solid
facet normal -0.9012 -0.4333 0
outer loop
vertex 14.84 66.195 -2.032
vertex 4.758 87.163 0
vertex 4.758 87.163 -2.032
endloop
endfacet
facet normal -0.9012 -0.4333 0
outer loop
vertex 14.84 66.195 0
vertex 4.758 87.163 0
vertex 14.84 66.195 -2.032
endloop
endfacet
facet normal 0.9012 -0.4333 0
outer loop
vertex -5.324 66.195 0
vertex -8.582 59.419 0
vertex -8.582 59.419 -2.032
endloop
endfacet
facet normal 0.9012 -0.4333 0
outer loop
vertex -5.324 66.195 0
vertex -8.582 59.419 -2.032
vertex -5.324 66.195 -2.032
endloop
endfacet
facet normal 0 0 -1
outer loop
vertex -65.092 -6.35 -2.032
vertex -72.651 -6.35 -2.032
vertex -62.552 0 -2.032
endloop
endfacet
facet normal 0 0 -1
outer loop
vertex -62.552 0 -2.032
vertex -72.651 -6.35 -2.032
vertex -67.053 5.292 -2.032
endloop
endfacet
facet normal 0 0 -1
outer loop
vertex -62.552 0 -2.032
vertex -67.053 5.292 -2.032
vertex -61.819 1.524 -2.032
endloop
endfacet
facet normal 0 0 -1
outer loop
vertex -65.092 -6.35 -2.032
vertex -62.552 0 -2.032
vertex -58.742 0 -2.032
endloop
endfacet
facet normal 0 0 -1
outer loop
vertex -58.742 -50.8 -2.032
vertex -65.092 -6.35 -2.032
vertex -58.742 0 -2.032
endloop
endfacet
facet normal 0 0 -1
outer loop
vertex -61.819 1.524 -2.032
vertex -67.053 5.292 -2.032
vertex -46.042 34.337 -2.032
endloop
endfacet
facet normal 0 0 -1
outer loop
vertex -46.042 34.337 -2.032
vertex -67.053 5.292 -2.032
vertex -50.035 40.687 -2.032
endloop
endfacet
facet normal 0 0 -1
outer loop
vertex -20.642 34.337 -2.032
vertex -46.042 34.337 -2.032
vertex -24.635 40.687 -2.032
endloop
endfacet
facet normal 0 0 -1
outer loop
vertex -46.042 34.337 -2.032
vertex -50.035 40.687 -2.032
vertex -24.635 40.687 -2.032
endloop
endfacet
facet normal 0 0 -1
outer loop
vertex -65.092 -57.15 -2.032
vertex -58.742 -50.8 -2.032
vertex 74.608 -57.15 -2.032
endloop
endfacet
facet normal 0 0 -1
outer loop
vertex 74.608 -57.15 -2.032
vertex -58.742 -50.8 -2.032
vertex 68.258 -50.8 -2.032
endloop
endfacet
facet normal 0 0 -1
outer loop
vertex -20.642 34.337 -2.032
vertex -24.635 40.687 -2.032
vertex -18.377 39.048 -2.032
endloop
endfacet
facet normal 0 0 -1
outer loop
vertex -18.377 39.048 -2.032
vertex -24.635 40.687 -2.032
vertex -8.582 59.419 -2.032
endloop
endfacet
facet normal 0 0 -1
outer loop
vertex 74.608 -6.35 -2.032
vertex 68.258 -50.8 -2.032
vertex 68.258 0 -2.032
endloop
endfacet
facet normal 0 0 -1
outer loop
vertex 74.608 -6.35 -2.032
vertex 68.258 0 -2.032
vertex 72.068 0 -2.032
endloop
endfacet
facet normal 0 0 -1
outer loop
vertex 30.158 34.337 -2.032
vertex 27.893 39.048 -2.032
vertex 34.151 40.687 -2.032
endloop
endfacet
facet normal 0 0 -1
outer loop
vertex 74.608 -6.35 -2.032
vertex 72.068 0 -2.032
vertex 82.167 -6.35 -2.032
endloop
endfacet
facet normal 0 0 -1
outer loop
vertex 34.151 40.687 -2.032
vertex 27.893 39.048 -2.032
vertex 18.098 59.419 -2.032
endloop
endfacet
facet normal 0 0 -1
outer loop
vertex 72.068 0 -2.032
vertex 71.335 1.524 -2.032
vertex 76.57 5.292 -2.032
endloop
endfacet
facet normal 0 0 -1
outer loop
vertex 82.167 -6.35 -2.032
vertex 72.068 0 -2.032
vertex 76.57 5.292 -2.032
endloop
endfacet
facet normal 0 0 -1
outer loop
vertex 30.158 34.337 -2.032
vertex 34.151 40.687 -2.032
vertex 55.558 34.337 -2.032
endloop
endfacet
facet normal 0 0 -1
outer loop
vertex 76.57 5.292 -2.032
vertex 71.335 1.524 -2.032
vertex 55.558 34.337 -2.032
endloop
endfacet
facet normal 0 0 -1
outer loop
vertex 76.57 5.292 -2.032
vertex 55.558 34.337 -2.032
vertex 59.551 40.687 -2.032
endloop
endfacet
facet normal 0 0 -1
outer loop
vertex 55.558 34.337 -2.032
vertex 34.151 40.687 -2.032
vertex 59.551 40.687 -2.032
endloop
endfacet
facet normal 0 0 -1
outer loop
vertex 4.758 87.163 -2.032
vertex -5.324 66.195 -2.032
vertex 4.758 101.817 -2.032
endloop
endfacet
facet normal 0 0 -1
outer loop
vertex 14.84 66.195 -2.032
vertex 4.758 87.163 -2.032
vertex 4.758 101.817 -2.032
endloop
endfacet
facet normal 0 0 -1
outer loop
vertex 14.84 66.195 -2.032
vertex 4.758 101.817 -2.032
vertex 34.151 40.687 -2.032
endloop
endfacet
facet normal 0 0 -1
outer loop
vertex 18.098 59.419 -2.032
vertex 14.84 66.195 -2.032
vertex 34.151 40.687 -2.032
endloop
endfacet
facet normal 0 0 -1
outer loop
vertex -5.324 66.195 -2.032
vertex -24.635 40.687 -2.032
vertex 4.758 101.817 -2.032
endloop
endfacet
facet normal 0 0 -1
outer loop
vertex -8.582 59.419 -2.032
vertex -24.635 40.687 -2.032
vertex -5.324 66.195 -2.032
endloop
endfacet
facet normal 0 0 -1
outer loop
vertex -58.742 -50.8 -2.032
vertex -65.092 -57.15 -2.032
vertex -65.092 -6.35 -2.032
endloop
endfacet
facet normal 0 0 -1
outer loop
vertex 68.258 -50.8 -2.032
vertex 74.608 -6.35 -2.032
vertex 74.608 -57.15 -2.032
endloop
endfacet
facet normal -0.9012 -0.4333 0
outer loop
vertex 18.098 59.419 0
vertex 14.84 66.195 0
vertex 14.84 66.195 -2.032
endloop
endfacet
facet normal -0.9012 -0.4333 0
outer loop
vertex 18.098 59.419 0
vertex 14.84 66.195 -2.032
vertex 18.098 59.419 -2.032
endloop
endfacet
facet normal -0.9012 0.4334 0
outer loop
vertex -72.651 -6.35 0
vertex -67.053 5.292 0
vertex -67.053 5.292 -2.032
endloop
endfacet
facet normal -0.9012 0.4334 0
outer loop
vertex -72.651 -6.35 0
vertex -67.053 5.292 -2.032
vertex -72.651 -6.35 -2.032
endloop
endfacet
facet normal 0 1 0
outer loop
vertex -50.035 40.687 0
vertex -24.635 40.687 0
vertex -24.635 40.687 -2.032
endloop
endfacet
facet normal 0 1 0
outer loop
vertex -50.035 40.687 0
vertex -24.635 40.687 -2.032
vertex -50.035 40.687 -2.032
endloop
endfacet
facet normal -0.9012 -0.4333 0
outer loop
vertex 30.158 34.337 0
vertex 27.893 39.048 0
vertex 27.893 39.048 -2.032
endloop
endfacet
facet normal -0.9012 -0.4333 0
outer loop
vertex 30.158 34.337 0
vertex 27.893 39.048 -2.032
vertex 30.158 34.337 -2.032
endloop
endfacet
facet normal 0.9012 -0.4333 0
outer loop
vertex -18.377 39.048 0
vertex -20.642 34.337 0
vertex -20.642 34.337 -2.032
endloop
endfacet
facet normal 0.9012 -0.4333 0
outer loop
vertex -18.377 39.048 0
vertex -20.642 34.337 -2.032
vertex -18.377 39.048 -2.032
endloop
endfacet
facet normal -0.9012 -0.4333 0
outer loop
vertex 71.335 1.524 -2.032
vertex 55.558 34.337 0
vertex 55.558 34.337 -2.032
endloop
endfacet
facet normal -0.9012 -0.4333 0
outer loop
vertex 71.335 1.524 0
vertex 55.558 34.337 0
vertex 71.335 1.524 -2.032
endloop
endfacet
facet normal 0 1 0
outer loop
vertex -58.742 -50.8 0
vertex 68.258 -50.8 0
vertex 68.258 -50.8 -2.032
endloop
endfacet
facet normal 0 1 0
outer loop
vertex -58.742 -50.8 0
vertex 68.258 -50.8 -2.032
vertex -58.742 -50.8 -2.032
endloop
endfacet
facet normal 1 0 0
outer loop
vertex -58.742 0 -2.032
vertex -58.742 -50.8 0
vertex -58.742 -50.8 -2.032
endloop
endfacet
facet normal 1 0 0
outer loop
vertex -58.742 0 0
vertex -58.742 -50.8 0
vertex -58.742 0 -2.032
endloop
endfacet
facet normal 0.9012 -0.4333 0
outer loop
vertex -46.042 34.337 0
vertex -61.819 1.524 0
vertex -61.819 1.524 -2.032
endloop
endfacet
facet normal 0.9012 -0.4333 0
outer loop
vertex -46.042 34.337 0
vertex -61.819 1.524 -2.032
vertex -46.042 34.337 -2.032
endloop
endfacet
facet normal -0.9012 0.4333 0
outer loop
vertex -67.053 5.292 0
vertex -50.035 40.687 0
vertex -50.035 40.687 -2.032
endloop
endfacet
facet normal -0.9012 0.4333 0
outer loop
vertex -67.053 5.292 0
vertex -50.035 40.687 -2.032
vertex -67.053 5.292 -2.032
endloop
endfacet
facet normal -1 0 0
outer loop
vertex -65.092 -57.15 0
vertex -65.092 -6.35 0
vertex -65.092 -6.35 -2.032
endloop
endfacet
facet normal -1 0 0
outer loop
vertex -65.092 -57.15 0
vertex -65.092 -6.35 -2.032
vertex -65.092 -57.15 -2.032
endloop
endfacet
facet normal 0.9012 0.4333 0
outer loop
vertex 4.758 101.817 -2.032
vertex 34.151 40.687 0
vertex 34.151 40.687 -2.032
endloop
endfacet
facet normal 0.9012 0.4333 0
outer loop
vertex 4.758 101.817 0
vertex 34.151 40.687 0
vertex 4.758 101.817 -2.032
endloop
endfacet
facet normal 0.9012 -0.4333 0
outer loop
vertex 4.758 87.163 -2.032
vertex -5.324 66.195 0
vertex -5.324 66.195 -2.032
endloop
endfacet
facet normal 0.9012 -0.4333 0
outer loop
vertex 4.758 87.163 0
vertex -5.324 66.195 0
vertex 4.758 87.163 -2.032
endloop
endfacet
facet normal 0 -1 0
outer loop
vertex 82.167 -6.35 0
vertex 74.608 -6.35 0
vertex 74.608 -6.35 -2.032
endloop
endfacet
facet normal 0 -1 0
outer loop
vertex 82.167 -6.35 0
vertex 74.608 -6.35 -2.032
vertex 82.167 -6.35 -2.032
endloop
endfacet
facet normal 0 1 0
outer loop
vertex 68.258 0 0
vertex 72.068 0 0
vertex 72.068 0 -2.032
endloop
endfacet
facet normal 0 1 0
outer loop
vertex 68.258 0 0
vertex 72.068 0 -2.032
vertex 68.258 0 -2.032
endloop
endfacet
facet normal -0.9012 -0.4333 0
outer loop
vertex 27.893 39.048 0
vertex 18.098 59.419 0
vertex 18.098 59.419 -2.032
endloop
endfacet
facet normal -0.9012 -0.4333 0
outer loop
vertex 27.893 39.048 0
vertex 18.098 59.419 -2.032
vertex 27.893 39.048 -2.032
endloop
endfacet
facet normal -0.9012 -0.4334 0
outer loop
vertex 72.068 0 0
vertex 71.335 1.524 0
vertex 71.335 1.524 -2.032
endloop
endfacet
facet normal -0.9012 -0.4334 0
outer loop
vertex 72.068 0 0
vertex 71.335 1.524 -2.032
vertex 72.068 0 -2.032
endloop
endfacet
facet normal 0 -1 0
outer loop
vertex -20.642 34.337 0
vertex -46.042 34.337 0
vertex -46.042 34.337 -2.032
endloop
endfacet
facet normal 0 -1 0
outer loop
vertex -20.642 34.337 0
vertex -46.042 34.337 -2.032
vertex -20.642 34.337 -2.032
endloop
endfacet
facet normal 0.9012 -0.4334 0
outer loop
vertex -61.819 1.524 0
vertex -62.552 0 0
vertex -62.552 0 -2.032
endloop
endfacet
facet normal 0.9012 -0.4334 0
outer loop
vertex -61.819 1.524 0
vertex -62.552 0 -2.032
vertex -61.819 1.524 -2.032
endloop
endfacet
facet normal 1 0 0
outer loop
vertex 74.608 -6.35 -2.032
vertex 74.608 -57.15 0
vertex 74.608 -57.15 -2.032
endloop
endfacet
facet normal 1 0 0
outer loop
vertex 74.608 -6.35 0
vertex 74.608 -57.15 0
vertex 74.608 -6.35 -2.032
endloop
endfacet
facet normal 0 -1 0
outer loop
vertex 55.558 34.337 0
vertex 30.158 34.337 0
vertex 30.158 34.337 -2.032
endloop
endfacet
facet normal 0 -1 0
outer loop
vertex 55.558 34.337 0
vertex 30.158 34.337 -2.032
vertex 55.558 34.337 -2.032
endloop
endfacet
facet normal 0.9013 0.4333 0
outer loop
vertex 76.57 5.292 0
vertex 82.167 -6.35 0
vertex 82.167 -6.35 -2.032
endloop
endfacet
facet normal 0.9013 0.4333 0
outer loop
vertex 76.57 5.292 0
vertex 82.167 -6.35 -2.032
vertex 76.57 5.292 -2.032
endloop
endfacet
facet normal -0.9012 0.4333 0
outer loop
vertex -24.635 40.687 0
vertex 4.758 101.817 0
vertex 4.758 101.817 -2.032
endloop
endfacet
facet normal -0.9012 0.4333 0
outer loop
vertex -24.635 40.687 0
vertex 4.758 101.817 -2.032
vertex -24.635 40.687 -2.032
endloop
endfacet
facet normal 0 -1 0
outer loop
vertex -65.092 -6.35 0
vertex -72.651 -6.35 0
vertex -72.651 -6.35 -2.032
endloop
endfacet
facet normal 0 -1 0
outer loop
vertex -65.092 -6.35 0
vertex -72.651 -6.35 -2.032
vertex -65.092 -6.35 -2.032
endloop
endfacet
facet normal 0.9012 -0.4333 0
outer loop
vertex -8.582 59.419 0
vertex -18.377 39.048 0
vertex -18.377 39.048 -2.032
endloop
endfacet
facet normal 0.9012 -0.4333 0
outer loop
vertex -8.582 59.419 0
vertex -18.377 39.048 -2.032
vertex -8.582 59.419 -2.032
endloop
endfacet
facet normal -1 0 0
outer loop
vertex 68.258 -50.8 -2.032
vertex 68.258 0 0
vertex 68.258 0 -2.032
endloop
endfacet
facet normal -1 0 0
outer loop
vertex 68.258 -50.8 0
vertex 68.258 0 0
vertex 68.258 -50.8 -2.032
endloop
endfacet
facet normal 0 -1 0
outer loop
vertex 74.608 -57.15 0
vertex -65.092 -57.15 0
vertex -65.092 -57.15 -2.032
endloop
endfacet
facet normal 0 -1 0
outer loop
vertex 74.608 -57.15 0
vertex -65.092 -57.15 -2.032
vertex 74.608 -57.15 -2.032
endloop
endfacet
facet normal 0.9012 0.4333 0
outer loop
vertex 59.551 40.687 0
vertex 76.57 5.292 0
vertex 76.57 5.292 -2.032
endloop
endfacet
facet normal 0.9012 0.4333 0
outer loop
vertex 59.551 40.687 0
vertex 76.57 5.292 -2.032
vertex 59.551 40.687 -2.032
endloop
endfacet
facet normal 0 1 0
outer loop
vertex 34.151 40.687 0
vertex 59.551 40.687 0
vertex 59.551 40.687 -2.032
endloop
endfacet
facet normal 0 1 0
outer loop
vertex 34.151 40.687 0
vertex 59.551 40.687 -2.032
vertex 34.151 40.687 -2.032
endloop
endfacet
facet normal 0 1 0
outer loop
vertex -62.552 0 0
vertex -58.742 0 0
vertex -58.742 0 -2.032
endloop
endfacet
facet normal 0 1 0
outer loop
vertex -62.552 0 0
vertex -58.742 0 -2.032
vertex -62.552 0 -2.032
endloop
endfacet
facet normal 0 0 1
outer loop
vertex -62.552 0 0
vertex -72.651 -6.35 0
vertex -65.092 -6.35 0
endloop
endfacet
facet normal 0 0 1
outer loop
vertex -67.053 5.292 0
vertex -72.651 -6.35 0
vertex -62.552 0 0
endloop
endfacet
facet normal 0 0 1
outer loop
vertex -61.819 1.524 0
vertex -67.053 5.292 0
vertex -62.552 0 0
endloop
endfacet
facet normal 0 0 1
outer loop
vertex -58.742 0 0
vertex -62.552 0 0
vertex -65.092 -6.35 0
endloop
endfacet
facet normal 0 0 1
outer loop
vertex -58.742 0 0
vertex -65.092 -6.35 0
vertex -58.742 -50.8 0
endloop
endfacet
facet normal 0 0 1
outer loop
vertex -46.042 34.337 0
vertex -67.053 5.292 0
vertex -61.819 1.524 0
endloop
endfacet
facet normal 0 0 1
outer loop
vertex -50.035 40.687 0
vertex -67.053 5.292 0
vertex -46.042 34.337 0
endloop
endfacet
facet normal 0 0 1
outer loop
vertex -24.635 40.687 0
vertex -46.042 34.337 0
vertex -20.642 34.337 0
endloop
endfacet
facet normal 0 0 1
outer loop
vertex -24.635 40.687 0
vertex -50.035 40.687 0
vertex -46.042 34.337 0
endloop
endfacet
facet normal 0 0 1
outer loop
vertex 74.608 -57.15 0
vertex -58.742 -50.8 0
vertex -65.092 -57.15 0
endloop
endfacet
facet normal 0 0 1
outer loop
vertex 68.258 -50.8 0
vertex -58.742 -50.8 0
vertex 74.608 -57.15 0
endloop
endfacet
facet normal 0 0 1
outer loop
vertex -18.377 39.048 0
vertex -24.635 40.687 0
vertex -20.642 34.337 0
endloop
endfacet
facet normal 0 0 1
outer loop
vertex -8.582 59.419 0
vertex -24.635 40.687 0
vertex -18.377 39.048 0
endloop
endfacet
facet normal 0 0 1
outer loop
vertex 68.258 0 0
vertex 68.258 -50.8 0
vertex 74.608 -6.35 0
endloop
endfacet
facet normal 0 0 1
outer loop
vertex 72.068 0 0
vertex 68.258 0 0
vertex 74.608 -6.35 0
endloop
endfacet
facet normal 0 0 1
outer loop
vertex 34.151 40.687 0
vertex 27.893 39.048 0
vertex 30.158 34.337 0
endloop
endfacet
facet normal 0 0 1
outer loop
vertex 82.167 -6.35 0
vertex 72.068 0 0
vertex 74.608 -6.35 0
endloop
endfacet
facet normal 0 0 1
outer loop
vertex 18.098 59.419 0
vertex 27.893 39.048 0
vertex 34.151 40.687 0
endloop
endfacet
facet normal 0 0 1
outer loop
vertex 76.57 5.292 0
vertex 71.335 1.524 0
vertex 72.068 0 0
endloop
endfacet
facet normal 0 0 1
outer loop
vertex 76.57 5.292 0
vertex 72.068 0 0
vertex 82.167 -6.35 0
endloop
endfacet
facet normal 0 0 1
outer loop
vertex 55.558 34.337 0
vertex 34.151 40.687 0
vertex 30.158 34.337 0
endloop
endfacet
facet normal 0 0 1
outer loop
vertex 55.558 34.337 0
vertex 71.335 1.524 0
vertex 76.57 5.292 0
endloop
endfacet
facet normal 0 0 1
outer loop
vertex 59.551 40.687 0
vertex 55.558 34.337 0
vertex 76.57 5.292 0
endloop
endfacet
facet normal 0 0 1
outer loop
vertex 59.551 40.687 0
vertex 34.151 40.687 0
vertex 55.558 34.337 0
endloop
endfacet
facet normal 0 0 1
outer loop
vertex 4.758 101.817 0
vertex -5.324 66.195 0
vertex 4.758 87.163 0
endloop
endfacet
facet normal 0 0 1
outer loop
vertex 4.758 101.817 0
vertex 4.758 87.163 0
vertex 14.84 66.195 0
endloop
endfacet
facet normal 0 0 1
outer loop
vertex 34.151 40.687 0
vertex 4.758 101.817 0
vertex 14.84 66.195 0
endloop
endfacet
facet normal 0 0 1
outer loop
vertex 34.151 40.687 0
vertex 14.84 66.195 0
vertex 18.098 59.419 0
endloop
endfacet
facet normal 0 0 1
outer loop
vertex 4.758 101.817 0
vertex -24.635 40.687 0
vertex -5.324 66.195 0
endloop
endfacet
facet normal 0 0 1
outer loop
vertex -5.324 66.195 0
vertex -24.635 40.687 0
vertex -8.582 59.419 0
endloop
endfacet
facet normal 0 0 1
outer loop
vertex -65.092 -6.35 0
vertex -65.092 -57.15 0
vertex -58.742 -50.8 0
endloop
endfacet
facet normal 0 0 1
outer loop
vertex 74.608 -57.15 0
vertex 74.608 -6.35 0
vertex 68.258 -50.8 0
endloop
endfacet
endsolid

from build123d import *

# Parameters (mm, degrees)
F1_DEPTH = 2.032


with BuildPart() as f1:
    # F0 (on Top) → F1 (new body)
    with BuildSketch(Plane.XY):
        Polygon((59.5508336694, 40.6870045497), (34.1508336694, 40.6870045497), (4.7581588602, 101.8170116116), (-24.634515949, 40.6870045497), (-50.034515949, 40.6870045497), (-67.0533862158, 5.2916665496), (-72.6509597748, -6.3499997298), (-65.0918408696, -6.3499997298), (-65.0918408696, -57.1499997298), (74.60815859, -57.1499997298), (74.60815859, -6.3499997298), (82.1672774952, -6.3499997298), (76.5697039363, 5.2916665496), align=None)
        Polygon((4.7581588602, 91.852396227), (31.4358146836, 36.3690045497), (56.8358146836, 36.3690045497), (72.6781767233, 3.4205332163), (75.2998765312, -2.0319997298), (70.29015859, -2.0319997298), (70.29015859, -52.8319997298), (-60.7738408696, -52.8319997298), (-60.7738408696, -2.0319997298), (-65.7835588108, -2.0319997298), (-63.1618590029, 3.4205332163), (-47.3194969632, 36.3690045497), (-23.4601999485, 36.3690045497), (-21.9194969632, 36.3690045497), align=None, mode=Mode.SUBTRACT)
        Polygon((56.8358146836, 36.3690045497), (31.4358146836, 36.3690045497), (4.7581588602, 91.852396227), (-21.9194969632, 36.3690045497), (-23.4601999485, 36.3690045497), (-47.3194969632, 36.3690045497), (-63.1618590029, 3.4205332163), (-65.7835588108, -2.0319997298), (-60.7738408696, -2.0319997298), (-60.7738408696, -52.8319997298), (70.29015859, -52.8319997298), (70.29015859, -2.0319997298), (75.2998765312, -2.0319997298), (72.6781767233, 3.4205332163), align=None)
        Polygon((68.2581588602, -50.8), (-58.7418411398, -50.8), (-58.7418411398, 0), (-62.5518411398, 0), (-61.8190678495, 1.524), (-46.0418411398, 34.3370048199), (-22.332856425, 34.3370048199), (-20.6418411398, 34.3370048199), (-18.376729311, 39.0479167388), (-8.5820728345, 59.4185506966), (-5.3240396144, 66.1945108652), (4.7581588602, 87.1631660812), (14.8403573348, 66.1945108652), (18.0983905549, 59.4185506966), (27.8930470314, 39.0479167388), (30.1581588602, 34.3370048199), (31.8491741455, 34.3370048199), (55.5581588602, 34.3370048199), (71.3353855699, 1.524), (72.0681588602, 0), (68.2581588602, 0), align=None, mode=Mode.SUBTRACT)
    extrude(amount=-F1_DEPTH)


solid = f1.part
